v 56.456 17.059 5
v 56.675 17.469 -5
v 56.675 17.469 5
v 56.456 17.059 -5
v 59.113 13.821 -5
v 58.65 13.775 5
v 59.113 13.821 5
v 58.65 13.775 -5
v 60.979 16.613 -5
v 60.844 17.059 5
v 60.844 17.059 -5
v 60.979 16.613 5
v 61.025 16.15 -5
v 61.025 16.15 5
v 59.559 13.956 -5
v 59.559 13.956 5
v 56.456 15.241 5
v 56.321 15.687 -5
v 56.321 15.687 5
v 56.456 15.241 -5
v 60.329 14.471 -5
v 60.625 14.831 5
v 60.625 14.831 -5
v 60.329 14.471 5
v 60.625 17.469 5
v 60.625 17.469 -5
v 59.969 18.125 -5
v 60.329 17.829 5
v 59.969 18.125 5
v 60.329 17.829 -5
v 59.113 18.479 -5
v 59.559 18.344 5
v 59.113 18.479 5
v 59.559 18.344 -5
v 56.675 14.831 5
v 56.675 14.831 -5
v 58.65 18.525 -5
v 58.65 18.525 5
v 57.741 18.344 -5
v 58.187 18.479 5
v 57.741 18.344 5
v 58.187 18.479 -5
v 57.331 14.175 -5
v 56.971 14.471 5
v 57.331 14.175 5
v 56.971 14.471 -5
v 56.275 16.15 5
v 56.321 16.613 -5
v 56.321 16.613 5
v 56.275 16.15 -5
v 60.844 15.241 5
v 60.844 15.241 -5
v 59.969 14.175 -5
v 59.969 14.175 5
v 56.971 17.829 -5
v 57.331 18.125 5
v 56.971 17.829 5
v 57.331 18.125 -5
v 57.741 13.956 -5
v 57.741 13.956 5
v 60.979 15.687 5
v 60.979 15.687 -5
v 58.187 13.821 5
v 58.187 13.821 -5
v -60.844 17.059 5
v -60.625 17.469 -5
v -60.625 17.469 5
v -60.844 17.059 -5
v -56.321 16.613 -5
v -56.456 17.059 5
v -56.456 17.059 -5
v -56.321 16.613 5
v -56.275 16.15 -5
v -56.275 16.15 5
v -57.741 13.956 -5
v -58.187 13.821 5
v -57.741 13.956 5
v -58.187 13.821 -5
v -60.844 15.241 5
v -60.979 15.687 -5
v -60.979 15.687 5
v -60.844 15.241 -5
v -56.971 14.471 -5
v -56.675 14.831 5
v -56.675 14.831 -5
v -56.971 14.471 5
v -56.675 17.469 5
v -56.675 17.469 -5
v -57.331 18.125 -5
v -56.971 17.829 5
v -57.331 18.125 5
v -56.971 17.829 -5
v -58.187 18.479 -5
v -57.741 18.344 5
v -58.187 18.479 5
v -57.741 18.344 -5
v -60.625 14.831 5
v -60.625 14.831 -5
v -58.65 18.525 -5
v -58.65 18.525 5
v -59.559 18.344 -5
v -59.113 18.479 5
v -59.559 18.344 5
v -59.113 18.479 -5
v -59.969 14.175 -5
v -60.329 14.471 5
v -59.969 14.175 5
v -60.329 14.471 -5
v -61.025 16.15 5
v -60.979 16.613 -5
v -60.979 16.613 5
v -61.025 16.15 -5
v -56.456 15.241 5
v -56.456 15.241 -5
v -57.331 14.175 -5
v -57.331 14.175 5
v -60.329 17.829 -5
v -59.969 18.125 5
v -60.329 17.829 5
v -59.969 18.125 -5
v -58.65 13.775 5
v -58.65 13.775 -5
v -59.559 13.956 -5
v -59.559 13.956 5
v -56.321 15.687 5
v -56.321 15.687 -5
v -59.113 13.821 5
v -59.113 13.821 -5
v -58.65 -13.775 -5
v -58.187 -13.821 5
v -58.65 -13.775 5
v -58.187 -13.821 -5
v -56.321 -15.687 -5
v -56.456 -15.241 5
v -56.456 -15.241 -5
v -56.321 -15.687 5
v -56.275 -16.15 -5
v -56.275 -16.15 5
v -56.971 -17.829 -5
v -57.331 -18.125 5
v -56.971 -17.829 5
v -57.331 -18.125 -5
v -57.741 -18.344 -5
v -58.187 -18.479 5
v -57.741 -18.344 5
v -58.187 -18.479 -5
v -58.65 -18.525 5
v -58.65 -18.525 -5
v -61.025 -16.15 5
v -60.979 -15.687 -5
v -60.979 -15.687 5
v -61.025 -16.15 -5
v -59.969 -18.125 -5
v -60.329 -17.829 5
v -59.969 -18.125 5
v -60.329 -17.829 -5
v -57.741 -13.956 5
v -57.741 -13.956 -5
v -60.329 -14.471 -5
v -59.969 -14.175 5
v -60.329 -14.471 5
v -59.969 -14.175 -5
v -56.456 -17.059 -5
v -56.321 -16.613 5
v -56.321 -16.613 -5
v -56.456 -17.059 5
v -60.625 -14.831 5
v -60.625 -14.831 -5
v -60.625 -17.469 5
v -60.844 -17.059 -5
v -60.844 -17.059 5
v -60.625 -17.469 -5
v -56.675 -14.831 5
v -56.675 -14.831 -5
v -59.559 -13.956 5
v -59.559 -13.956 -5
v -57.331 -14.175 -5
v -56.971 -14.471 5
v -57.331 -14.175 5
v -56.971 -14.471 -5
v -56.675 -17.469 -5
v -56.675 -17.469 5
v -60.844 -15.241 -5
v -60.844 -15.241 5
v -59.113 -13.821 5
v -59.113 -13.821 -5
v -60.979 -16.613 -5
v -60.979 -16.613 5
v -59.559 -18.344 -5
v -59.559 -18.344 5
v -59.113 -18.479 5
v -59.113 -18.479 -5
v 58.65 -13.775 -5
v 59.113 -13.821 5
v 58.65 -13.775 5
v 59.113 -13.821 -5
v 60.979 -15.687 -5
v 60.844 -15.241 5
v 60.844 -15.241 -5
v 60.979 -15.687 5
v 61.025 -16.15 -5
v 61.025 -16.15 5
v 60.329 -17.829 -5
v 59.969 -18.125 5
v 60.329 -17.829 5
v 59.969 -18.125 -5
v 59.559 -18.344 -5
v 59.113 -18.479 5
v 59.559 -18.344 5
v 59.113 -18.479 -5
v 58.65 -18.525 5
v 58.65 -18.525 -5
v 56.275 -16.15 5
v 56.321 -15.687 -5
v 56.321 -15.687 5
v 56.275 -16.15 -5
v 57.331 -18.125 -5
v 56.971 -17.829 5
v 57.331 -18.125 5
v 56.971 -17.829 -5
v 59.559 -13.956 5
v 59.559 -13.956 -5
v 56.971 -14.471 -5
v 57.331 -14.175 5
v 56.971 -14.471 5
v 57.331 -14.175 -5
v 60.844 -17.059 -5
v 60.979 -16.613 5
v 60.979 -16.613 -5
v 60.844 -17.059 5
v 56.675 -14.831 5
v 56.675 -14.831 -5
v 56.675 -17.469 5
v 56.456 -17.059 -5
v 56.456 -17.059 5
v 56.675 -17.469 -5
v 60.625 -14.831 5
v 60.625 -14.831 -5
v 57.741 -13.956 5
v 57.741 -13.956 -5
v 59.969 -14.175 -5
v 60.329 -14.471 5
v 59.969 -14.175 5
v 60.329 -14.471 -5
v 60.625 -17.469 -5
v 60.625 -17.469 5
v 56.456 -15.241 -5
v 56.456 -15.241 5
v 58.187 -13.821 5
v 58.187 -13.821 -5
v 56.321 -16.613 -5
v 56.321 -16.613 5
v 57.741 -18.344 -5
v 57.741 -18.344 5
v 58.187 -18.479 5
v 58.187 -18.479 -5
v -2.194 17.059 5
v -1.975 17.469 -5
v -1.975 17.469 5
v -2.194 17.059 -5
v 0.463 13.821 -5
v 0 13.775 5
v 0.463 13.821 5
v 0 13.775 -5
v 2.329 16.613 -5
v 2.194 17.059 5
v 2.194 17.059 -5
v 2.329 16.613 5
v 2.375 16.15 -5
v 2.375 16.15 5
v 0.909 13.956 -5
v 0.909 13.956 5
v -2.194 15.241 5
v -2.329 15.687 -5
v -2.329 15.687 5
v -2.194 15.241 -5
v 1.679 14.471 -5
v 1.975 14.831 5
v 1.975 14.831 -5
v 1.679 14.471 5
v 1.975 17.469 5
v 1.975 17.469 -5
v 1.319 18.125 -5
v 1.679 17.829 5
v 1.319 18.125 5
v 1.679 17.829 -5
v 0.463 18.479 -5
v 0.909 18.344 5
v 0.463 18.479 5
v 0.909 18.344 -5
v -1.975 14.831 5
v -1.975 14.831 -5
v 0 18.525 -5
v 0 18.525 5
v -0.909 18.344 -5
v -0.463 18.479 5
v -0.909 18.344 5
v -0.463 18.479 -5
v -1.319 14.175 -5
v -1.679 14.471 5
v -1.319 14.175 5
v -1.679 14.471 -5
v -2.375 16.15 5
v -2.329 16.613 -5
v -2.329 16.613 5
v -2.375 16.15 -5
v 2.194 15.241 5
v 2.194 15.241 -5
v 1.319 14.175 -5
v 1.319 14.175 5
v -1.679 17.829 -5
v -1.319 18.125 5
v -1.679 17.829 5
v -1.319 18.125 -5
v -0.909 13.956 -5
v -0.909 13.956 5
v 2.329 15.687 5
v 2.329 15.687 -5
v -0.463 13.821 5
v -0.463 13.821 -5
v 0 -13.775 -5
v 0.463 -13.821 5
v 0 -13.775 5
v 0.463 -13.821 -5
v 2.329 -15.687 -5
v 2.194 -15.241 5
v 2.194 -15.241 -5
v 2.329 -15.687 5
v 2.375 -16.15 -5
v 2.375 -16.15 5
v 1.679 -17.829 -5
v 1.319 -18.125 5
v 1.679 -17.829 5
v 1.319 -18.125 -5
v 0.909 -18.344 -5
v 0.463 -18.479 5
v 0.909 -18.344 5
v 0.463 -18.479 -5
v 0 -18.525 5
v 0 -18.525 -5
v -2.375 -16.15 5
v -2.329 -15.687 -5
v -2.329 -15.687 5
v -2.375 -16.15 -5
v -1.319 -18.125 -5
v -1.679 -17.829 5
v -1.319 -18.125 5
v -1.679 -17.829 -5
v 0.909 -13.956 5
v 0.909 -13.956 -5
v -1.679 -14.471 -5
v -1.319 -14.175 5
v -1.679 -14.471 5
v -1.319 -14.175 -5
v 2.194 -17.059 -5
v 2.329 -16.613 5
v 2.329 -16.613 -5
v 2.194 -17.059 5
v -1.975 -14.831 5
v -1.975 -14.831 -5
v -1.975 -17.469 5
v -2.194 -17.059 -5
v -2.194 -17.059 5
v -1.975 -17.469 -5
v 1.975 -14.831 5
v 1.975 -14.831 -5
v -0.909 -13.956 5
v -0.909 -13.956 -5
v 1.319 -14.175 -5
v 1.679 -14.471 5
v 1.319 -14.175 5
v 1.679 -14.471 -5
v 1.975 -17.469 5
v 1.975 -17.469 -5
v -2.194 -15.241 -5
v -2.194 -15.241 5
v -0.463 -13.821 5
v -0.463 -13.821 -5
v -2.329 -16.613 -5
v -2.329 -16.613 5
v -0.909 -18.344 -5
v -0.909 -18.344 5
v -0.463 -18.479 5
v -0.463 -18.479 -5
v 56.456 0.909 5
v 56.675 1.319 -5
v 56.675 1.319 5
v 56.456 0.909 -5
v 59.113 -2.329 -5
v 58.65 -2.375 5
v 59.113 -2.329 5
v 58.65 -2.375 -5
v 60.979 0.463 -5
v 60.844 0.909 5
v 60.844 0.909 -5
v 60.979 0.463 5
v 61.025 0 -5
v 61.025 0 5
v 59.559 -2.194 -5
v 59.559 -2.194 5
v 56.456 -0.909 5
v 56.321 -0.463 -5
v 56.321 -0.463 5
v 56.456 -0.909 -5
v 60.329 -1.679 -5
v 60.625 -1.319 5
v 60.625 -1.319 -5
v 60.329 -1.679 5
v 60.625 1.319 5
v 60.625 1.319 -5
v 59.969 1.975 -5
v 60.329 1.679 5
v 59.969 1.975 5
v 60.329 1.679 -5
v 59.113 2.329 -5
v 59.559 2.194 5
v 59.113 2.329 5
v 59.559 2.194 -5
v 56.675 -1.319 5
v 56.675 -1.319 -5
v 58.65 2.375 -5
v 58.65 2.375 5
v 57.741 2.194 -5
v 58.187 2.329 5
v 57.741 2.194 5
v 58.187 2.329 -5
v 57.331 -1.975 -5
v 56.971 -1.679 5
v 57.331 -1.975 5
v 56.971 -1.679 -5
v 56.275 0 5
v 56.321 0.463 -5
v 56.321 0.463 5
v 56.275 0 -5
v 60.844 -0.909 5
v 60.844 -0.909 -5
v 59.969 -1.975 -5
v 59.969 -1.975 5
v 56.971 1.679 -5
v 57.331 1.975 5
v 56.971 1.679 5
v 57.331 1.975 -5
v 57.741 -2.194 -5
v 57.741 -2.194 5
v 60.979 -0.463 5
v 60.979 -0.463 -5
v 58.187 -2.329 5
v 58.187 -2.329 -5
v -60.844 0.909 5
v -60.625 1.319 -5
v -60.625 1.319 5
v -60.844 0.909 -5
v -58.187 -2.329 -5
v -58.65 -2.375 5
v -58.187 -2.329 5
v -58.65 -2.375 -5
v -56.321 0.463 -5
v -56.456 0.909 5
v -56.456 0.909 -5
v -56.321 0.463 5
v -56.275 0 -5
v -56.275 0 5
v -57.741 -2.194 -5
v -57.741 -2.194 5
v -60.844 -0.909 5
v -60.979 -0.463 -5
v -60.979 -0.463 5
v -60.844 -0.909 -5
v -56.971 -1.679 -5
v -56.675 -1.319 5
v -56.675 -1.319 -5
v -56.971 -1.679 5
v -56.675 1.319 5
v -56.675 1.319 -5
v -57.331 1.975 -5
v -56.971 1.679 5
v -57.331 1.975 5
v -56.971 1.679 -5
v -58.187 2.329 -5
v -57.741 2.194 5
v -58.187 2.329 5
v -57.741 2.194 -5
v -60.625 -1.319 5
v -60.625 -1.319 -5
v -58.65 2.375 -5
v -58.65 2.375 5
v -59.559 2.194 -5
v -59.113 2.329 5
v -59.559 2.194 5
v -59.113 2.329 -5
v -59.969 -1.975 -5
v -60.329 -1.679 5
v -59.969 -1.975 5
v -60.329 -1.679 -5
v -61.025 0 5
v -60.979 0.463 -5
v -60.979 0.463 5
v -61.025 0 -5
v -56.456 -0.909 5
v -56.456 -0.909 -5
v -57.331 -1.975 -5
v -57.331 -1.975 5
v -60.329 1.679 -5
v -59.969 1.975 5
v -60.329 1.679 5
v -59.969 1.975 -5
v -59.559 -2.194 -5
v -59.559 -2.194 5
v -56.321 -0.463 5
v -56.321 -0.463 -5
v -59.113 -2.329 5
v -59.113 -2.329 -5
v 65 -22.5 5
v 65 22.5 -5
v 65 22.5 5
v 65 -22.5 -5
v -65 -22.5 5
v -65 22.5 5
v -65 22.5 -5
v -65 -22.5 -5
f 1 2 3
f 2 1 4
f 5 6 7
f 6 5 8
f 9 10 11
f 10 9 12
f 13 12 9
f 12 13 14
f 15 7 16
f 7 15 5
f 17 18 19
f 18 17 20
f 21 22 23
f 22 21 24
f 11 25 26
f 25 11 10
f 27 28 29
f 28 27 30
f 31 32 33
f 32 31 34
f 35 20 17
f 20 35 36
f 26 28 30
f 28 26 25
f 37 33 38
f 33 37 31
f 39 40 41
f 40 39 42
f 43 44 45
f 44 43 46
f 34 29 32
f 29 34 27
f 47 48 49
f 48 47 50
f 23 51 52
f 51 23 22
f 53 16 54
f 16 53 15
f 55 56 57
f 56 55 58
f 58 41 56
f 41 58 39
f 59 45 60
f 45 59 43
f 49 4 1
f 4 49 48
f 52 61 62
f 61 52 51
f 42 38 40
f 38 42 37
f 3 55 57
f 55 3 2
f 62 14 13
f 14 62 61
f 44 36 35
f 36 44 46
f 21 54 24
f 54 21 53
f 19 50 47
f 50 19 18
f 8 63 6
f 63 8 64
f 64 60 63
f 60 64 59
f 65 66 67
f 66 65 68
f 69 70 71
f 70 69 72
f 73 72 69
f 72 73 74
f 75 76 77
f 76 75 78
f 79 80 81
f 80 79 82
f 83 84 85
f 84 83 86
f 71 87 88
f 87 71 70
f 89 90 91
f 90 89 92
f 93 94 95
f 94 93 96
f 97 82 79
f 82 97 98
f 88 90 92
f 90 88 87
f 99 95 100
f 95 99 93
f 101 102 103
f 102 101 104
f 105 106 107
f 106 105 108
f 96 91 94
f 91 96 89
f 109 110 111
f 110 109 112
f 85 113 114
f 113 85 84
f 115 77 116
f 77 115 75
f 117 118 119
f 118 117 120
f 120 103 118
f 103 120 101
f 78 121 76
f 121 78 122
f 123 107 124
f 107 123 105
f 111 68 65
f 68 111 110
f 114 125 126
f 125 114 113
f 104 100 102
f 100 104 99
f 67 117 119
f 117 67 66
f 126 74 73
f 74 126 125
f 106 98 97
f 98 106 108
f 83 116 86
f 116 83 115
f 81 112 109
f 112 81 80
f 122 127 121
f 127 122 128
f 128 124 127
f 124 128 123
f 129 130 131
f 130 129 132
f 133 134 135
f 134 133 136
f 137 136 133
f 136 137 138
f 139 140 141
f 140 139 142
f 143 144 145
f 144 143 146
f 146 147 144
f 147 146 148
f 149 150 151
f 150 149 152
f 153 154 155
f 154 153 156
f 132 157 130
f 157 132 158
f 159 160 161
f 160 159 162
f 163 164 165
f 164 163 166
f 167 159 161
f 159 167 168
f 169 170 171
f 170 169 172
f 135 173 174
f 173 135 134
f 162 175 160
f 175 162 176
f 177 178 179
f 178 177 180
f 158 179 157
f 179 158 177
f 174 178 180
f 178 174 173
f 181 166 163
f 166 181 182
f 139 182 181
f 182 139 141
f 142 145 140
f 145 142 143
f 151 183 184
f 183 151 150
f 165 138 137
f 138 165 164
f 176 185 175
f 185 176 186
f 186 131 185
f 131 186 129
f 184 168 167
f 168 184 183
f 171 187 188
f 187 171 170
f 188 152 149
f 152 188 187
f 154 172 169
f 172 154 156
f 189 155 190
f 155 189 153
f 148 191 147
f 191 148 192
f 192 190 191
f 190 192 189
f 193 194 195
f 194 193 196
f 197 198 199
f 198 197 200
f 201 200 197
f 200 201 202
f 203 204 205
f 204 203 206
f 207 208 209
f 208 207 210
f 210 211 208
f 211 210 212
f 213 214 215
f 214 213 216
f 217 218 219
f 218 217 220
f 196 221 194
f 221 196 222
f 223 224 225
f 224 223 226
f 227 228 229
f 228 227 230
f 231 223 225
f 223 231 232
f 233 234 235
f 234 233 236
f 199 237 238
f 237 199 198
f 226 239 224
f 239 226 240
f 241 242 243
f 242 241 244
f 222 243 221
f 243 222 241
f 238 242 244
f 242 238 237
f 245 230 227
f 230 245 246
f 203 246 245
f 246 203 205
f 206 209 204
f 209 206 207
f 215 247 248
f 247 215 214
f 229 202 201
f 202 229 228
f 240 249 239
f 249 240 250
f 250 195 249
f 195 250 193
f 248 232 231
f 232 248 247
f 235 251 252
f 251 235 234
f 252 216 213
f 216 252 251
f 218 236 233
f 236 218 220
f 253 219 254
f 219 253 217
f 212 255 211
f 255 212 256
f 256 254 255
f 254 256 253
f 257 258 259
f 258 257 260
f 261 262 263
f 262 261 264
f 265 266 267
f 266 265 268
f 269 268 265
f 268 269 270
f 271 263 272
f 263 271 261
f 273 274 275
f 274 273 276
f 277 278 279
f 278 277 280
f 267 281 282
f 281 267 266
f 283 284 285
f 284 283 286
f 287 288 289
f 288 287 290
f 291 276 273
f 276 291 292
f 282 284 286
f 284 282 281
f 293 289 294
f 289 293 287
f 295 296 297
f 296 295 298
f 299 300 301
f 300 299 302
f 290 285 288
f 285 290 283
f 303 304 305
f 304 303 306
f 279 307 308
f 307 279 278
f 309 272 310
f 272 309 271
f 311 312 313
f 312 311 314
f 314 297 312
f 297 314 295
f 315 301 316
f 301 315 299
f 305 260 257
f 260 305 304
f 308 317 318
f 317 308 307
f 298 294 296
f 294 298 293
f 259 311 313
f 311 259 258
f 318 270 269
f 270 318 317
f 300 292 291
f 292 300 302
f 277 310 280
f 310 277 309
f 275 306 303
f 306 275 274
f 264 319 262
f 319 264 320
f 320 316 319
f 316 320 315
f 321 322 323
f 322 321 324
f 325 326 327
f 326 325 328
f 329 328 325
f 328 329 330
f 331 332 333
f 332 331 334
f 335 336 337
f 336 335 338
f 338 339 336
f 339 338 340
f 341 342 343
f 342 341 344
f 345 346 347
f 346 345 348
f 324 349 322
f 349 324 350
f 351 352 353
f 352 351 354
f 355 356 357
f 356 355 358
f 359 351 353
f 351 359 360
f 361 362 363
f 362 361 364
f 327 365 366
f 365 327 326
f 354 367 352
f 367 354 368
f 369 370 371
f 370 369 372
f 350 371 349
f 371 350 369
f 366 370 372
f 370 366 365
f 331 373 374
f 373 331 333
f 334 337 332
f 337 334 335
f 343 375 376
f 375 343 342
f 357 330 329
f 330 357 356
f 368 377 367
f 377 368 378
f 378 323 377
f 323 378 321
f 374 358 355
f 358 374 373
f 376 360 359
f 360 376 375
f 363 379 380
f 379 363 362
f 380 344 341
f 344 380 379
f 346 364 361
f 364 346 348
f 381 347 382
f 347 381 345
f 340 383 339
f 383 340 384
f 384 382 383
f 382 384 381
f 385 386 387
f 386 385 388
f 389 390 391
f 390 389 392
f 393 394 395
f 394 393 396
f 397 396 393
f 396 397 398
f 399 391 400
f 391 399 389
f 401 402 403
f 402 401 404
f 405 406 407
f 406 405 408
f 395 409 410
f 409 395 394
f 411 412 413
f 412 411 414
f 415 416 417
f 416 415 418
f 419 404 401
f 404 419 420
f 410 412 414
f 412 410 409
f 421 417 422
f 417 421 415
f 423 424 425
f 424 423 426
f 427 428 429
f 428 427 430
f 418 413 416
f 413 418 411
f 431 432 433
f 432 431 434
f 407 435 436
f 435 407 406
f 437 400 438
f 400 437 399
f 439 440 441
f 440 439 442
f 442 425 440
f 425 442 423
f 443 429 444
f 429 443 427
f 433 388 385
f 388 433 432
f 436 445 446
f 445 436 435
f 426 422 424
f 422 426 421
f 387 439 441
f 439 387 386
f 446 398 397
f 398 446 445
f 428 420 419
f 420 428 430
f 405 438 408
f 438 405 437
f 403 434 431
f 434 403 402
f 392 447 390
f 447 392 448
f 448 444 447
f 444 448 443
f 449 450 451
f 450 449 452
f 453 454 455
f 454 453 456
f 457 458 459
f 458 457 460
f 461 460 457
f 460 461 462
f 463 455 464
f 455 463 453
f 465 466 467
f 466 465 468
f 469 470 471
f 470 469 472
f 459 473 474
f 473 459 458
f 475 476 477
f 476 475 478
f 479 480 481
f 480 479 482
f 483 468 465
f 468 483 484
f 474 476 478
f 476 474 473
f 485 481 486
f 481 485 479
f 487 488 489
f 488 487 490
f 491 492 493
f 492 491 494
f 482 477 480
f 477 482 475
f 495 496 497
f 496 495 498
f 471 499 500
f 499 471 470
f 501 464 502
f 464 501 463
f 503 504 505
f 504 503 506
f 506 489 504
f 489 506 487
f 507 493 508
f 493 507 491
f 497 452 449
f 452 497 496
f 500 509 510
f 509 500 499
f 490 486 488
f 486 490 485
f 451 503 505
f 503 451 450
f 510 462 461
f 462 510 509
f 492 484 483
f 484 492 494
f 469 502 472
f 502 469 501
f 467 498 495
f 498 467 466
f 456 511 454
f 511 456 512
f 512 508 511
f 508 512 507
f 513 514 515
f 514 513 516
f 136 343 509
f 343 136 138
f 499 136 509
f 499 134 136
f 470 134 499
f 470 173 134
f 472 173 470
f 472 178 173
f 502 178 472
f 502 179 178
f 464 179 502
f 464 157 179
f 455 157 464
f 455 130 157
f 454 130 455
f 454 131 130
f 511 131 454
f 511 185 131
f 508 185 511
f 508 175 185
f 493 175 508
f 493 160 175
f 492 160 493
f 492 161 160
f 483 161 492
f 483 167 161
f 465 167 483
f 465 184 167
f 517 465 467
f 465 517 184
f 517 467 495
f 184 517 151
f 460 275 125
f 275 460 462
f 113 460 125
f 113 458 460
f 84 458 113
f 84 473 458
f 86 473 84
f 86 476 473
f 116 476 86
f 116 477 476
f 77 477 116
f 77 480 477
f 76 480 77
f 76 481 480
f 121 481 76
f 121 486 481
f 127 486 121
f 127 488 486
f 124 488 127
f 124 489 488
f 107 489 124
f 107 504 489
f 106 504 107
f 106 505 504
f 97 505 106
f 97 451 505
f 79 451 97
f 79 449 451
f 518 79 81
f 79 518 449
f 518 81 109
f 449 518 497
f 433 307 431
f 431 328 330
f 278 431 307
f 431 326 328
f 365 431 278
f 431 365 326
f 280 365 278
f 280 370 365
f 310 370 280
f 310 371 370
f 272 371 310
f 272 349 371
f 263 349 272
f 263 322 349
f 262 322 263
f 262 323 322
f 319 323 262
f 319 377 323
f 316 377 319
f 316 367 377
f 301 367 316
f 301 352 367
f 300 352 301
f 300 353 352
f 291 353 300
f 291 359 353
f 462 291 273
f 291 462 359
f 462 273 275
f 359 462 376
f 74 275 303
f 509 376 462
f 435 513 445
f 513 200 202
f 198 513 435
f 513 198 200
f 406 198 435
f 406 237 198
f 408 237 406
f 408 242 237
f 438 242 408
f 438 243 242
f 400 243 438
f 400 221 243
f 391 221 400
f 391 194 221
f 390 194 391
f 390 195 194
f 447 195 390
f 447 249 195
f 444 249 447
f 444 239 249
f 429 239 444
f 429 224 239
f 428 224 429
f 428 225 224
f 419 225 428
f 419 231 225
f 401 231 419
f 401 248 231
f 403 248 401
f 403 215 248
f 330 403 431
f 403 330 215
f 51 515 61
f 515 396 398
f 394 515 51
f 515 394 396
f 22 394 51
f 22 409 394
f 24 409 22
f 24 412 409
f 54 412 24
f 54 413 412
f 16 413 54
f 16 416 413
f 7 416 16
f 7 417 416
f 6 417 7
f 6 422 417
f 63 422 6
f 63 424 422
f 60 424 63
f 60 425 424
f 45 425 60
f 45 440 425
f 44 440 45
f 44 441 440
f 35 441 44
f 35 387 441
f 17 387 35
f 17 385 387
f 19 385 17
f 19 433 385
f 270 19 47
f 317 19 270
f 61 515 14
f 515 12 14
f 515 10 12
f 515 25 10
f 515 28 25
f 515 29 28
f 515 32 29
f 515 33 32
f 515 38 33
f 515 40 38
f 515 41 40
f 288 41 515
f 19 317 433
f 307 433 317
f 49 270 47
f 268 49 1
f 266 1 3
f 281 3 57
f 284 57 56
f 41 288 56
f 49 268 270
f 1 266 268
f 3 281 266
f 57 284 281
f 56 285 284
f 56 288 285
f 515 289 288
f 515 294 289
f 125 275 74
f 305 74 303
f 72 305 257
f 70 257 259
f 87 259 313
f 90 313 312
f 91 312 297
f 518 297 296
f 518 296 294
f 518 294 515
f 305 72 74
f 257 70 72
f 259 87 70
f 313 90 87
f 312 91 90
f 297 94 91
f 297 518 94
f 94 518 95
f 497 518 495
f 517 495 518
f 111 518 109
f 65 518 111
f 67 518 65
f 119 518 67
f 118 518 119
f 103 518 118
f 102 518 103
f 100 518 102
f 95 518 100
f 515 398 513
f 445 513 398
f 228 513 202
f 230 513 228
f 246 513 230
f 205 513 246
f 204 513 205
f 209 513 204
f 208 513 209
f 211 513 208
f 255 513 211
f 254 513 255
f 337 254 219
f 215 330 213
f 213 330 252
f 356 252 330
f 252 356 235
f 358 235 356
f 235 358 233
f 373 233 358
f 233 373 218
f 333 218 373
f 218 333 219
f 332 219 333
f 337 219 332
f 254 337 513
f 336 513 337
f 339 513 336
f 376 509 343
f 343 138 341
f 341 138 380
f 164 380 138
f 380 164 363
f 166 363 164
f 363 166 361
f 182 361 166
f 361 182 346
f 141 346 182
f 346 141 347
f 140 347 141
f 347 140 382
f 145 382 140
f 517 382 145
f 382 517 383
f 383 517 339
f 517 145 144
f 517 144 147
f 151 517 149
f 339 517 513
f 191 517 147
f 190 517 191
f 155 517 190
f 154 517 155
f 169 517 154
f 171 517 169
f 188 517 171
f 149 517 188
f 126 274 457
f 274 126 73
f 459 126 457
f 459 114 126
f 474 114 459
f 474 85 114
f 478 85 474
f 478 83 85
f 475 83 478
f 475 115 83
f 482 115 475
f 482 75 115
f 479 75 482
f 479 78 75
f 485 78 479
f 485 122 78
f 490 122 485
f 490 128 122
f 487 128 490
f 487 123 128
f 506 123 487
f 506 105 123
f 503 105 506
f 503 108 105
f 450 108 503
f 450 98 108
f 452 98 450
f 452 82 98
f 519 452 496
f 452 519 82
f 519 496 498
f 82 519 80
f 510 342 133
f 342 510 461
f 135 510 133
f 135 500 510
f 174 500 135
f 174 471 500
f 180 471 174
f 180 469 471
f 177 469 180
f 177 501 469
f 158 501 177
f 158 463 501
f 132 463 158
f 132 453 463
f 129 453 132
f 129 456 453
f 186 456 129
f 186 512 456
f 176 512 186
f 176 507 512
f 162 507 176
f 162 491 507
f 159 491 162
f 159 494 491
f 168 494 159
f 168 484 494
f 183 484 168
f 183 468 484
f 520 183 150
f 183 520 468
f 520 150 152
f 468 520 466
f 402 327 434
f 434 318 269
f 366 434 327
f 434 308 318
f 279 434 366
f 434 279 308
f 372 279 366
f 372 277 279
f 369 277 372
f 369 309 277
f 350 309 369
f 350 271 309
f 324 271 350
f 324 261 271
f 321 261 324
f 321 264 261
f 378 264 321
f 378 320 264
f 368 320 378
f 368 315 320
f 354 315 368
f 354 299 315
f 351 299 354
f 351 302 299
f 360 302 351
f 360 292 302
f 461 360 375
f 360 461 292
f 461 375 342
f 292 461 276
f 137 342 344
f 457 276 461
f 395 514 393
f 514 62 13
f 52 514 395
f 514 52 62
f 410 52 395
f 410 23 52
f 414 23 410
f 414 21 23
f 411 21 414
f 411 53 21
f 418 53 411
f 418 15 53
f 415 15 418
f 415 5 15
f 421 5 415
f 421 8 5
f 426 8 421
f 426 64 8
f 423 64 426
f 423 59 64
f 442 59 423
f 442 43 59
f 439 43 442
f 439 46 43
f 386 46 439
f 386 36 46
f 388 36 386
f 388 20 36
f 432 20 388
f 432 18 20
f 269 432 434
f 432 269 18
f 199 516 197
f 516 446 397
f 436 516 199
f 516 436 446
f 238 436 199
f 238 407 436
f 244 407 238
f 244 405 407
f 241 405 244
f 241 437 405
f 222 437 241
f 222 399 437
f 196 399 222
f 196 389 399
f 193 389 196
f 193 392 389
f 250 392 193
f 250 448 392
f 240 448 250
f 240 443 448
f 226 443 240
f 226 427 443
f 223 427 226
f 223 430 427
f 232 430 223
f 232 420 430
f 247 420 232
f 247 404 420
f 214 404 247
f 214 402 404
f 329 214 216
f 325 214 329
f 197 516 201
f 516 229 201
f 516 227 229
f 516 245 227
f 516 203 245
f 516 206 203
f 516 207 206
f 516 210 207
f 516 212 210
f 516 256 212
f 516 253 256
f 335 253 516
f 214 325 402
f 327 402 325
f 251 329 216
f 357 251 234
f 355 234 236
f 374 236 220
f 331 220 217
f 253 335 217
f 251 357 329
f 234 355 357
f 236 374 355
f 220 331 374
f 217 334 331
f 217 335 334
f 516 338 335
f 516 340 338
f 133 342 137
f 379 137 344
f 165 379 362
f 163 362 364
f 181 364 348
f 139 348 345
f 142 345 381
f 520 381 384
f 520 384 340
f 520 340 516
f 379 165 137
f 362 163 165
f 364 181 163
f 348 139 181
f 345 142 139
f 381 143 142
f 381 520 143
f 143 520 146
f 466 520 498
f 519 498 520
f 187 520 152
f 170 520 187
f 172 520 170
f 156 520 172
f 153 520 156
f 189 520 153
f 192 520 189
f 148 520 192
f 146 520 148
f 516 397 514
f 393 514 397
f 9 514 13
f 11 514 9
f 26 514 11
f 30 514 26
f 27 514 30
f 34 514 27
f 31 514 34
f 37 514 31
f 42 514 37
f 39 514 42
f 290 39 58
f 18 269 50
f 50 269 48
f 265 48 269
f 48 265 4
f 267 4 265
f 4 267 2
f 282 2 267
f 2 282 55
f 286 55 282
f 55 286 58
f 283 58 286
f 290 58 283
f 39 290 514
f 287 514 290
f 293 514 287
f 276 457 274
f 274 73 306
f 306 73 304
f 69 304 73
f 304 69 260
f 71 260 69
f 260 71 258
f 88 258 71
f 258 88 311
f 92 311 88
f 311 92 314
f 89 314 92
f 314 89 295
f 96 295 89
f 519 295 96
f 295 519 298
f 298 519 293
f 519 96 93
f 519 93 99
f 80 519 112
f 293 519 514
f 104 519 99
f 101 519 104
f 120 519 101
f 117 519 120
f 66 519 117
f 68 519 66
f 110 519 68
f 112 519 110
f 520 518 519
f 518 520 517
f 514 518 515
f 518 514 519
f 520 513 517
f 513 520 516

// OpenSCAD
$fn = 32;

// ----------------------------------------------------------------------
// Corner plate 130 x 45 x 10
// 8 holes, centres taken from the edge offset
// ----------------------------------------------------------------------

// --- parameters (mm) ---
plate = [130, 45, 10];   // overall size (x, y, z)
holes = 8;               // number of holes the drawing asks for
bore_d = 4.5;            // nominal hole diameter from the drawing
print_allowance = 0.25;  // clearance added for printing
edge = 6.35;             // hole centre offset from the plate edge

// --- derived feature positions (mm) ---
hole_d = bore_d + print_allowance;  // = 4.75   hole diameter as printed
corner_x = plate[0] / 2 - edge;     // = 58.65   corner hole X
corner_y = plate[1] / 2 - edge;     // = 16.15   corner hole Y
feature_centers = [
  [corner_x, corner_y],
  [-corner_x, corner_y],
  [-corner_x, -corner_y],
  [corner_x, -corner_y],
  [0, corner_y],
  [0, -corner_y],
  [corner_x, 0],
  [-corner_x, 0]
];   // hole centres the loop below drills

// plate outline, every hole drilled through with the same cutters
difference() {
  cube(plate, center = true);
  for (centre = feature_centers)
    translate([centre[0], centre[1], 0])
      cylinder(d = hole_d, h = plate[2] + 2, center = true);
}
